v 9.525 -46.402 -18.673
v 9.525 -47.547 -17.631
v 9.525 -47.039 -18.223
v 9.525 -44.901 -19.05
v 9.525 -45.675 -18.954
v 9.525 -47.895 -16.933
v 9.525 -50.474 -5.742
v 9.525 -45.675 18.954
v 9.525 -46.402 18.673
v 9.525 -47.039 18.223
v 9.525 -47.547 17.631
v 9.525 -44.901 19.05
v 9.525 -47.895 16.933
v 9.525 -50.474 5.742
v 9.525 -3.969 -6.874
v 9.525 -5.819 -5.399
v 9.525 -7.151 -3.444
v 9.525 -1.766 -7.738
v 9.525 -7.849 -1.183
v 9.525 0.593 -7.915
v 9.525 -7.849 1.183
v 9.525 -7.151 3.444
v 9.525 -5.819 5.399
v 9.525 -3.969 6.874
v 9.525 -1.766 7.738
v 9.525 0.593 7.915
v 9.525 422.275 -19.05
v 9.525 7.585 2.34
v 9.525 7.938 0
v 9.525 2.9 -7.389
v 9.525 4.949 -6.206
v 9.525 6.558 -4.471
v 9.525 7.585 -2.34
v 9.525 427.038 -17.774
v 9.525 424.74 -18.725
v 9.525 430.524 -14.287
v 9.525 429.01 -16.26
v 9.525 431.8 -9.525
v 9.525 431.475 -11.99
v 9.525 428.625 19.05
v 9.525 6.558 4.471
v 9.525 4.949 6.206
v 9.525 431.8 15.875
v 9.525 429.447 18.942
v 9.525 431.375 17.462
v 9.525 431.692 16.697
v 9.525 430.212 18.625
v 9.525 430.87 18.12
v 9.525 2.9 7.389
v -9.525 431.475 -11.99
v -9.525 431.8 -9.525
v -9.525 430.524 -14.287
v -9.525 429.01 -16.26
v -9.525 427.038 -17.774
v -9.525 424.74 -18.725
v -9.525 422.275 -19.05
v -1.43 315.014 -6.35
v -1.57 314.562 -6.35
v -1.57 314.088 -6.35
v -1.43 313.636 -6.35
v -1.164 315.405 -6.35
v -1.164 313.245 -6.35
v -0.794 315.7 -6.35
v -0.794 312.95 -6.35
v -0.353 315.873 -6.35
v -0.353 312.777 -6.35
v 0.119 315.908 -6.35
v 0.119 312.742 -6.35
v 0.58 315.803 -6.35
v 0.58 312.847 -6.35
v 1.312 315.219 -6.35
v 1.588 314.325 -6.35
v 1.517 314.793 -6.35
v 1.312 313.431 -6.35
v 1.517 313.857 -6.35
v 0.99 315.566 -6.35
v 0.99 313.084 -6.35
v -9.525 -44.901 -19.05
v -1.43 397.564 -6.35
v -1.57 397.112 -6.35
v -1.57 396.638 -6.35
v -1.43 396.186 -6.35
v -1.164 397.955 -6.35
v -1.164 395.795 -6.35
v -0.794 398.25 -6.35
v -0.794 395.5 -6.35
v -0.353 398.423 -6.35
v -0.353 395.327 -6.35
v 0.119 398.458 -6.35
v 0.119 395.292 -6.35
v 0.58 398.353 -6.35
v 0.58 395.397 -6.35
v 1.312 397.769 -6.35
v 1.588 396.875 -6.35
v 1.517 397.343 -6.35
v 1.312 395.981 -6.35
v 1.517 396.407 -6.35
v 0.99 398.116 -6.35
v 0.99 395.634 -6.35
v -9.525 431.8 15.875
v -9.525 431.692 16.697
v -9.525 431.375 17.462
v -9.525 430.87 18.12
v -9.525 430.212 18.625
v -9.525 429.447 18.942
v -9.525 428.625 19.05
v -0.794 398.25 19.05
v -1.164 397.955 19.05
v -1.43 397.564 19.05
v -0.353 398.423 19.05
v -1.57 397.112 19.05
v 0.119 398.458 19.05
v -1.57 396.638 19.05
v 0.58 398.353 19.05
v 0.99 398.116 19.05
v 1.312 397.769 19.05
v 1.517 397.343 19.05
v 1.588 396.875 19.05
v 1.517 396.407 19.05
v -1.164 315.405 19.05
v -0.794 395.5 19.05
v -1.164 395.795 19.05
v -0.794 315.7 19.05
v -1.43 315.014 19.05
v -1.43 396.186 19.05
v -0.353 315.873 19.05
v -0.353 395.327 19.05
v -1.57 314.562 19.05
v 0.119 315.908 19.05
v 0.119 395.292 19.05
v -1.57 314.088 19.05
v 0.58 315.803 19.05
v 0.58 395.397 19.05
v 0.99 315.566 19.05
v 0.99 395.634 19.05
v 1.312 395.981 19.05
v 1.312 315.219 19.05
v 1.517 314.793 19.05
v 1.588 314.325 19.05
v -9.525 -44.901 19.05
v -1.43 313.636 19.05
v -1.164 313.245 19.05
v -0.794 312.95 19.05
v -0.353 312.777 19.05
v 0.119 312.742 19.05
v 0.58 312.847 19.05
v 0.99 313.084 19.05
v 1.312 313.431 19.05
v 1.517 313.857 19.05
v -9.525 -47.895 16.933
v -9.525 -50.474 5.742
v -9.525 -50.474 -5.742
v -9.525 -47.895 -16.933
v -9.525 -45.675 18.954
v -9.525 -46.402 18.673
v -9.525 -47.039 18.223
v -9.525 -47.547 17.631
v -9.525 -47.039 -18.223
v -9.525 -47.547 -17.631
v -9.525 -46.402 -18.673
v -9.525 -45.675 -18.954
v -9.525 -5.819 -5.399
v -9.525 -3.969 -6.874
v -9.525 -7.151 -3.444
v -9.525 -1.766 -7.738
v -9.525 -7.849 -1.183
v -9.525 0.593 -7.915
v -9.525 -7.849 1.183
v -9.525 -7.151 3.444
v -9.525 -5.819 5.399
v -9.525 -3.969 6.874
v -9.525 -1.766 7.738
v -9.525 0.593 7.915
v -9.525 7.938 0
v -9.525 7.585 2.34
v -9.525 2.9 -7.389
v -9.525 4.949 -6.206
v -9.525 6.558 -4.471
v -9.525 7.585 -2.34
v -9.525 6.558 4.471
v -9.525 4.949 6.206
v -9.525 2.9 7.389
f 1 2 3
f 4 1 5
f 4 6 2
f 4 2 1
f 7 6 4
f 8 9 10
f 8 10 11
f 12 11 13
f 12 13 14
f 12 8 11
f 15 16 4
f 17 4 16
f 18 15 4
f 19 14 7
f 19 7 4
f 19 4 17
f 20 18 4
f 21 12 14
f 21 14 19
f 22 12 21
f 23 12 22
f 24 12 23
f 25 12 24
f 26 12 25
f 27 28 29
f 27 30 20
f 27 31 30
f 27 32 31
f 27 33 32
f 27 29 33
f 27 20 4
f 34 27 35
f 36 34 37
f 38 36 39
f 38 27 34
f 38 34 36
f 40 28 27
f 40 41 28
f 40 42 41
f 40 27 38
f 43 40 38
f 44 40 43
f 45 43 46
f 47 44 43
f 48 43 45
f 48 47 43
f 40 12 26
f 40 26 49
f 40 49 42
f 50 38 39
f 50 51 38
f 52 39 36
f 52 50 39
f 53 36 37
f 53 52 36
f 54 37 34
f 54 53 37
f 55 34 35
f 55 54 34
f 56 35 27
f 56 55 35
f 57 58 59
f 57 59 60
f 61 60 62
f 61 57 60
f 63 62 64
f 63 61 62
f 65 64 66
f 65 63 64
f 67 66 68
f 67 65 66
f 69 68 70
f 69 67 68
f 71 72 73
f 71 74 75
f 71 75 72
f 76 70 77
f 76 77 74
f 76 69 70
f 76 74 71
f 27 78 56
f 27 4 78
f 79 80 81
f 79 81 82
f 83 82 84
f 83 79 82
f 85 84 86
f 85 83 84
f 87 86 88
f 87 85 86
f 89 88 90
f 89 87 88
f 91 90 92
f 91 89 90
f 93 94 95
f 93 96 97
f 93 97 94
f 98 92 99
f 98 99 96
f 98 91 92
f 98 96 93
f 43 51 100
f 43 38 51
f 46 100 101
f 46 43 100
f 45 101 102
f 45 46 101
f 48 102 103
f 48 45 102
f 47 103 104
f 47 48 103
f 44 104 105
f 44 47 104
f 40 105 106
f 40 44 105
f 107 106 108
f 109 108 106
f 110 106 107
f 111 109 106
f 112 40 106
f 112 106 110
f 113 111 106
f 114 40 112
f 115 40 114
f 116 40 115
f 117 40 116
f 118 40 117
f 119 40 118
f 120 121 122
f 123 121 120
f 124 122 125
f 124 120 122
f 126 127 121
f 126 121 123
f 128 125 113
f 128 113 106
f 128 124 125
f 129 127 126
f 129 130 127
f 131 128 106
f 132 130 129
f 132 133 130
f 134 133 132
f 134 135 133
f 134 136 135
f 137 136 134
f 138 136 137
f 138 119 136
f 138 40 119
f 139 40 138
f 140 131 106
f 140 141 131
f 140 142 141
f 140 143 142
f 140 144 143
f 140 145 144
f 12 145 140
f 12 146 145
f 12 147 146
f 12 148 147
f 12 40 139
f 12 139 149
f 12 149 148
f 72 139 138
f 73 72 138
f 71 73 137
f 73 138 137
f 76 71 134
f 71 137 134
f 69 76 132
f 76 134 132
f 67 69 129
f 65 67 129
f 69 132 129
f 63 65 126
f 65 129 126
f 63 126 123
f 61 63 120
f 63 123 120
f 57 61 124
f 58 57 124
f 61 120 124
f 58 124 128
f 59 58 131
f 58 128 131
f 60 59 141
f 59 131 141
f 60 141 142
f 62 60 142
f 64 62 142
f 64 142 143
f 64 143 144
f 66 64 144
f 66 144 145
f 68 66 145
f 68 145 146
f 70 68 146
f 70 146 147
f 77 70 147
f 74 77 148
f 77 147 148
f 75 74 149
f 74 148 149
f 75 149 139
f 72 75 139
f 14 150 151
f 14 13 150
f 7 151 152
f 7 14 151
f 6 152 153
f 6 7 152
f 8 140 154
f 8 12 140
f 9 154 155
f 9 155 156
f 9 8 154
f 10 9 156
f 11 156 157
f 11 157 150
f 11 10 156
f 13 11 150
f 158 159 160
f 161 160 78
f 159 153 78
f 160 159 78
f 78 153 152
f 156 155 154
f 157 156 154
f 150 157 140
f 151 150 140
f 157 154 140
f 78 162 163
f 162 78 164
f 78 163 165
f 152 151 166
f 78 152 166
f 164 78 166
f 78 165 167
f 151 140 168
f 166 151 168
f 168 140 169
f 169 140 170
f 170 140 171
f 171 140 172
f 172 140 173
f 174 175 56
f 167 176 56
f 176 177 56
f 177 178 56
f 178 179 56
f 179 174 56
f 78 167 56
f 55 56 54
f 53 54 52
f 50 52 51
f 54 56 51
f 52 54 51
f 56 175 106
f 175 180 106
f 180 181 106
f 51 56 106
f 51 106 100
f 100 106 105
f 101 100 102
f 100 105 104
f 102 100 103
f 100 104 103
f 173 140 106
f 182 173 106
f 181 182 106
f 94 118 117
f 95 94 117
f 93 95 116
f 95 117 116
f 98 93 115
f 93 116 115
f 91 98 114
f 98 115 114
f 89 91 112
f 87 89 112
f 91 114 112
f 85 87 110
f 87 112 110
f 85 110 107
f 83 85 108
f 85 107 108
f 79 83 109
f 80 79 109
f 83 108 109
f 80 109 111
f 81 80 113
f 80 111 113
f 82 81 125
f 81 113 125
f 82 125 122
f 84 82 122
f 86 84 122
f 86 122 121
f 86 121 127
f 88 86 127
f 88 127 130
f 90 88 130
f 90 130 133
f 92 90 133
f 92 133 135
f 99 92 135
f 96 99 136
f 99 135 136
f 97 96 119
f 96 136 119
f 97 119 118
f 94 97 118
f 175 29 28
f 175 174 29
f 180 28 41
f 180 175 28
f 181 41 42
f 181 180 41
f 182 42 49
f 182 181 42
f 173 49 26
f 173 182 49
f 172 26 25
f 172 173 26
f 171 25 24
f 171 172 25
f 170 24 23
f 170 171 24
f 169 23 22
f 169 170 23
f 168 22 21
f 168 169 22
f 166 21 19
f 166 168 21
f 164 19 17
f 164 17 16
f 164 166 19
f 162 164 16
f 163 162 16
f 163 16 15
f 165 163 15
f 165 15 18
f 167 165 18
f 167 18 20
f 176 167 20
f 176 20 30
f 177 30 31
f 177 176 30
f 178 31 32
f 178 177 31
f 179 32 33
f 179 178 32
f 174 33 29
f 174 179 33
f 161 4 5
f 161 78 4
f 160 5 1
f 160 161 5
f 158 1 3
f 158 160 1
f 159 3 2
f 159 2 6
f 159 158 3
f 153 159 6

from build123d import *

# Parameters (mm, degrees)
F0_R     = 7.9375
F1_DEPTH = 9.525
F2_R     = 1.5875
F3_DEPTH = 25.4
F4_R     = 9.525
F5_R     = 3.175


with BuildPart() as f1:
    # F0 (on Right) → F1 (new body, symmetric)
    with BuildSketch(Plane.YZ):
        with BuildLine():
            Line((431.8, -19.05), (431.8, 19.05))
            Line((431.8, 19.05), (-47.09286, 19.05))
            ThreePointArc((-47.09286, 19.05), (-50.8, 0), (-47.09286, -19.05))
            Line((-47.09286, -19.05), (431.8, -19.05))
        make_face()
        Circle(F0_R, mode=Mode.SUBTRACT)
    extrude(amount=F1_DEPTH, both=True)

    # F2 (on face) → F3 (cut)
    with BuildSketch(Plane.XY.offset(19.05)):
        with Locations((0, 396.875)):
            Circle(F2_R)
        with Locations((0, 314.325)):
            Circle(F2_R)
    extrude(amount=-F3_DEPTH, mode=Mode.SUBTRACT)

    # F4
    f4_edges = [f1.edges().sort_by_distance(p)[0] for p in [
        (0, 431.8, -19.05),
    ]]
    fillet(f4_edges, radius=F4_R)

    # F5
    f5_edges = [f1.edges().sort_by_distance(p)[0] for p in [
        (0, 431.8, 19.05),
        (0, -47.09286, -19.05),
        (0, -47.09286, 19.05),
    ]]
    fillet(f5_edges, radius=F5_R)


solid = f1.part
